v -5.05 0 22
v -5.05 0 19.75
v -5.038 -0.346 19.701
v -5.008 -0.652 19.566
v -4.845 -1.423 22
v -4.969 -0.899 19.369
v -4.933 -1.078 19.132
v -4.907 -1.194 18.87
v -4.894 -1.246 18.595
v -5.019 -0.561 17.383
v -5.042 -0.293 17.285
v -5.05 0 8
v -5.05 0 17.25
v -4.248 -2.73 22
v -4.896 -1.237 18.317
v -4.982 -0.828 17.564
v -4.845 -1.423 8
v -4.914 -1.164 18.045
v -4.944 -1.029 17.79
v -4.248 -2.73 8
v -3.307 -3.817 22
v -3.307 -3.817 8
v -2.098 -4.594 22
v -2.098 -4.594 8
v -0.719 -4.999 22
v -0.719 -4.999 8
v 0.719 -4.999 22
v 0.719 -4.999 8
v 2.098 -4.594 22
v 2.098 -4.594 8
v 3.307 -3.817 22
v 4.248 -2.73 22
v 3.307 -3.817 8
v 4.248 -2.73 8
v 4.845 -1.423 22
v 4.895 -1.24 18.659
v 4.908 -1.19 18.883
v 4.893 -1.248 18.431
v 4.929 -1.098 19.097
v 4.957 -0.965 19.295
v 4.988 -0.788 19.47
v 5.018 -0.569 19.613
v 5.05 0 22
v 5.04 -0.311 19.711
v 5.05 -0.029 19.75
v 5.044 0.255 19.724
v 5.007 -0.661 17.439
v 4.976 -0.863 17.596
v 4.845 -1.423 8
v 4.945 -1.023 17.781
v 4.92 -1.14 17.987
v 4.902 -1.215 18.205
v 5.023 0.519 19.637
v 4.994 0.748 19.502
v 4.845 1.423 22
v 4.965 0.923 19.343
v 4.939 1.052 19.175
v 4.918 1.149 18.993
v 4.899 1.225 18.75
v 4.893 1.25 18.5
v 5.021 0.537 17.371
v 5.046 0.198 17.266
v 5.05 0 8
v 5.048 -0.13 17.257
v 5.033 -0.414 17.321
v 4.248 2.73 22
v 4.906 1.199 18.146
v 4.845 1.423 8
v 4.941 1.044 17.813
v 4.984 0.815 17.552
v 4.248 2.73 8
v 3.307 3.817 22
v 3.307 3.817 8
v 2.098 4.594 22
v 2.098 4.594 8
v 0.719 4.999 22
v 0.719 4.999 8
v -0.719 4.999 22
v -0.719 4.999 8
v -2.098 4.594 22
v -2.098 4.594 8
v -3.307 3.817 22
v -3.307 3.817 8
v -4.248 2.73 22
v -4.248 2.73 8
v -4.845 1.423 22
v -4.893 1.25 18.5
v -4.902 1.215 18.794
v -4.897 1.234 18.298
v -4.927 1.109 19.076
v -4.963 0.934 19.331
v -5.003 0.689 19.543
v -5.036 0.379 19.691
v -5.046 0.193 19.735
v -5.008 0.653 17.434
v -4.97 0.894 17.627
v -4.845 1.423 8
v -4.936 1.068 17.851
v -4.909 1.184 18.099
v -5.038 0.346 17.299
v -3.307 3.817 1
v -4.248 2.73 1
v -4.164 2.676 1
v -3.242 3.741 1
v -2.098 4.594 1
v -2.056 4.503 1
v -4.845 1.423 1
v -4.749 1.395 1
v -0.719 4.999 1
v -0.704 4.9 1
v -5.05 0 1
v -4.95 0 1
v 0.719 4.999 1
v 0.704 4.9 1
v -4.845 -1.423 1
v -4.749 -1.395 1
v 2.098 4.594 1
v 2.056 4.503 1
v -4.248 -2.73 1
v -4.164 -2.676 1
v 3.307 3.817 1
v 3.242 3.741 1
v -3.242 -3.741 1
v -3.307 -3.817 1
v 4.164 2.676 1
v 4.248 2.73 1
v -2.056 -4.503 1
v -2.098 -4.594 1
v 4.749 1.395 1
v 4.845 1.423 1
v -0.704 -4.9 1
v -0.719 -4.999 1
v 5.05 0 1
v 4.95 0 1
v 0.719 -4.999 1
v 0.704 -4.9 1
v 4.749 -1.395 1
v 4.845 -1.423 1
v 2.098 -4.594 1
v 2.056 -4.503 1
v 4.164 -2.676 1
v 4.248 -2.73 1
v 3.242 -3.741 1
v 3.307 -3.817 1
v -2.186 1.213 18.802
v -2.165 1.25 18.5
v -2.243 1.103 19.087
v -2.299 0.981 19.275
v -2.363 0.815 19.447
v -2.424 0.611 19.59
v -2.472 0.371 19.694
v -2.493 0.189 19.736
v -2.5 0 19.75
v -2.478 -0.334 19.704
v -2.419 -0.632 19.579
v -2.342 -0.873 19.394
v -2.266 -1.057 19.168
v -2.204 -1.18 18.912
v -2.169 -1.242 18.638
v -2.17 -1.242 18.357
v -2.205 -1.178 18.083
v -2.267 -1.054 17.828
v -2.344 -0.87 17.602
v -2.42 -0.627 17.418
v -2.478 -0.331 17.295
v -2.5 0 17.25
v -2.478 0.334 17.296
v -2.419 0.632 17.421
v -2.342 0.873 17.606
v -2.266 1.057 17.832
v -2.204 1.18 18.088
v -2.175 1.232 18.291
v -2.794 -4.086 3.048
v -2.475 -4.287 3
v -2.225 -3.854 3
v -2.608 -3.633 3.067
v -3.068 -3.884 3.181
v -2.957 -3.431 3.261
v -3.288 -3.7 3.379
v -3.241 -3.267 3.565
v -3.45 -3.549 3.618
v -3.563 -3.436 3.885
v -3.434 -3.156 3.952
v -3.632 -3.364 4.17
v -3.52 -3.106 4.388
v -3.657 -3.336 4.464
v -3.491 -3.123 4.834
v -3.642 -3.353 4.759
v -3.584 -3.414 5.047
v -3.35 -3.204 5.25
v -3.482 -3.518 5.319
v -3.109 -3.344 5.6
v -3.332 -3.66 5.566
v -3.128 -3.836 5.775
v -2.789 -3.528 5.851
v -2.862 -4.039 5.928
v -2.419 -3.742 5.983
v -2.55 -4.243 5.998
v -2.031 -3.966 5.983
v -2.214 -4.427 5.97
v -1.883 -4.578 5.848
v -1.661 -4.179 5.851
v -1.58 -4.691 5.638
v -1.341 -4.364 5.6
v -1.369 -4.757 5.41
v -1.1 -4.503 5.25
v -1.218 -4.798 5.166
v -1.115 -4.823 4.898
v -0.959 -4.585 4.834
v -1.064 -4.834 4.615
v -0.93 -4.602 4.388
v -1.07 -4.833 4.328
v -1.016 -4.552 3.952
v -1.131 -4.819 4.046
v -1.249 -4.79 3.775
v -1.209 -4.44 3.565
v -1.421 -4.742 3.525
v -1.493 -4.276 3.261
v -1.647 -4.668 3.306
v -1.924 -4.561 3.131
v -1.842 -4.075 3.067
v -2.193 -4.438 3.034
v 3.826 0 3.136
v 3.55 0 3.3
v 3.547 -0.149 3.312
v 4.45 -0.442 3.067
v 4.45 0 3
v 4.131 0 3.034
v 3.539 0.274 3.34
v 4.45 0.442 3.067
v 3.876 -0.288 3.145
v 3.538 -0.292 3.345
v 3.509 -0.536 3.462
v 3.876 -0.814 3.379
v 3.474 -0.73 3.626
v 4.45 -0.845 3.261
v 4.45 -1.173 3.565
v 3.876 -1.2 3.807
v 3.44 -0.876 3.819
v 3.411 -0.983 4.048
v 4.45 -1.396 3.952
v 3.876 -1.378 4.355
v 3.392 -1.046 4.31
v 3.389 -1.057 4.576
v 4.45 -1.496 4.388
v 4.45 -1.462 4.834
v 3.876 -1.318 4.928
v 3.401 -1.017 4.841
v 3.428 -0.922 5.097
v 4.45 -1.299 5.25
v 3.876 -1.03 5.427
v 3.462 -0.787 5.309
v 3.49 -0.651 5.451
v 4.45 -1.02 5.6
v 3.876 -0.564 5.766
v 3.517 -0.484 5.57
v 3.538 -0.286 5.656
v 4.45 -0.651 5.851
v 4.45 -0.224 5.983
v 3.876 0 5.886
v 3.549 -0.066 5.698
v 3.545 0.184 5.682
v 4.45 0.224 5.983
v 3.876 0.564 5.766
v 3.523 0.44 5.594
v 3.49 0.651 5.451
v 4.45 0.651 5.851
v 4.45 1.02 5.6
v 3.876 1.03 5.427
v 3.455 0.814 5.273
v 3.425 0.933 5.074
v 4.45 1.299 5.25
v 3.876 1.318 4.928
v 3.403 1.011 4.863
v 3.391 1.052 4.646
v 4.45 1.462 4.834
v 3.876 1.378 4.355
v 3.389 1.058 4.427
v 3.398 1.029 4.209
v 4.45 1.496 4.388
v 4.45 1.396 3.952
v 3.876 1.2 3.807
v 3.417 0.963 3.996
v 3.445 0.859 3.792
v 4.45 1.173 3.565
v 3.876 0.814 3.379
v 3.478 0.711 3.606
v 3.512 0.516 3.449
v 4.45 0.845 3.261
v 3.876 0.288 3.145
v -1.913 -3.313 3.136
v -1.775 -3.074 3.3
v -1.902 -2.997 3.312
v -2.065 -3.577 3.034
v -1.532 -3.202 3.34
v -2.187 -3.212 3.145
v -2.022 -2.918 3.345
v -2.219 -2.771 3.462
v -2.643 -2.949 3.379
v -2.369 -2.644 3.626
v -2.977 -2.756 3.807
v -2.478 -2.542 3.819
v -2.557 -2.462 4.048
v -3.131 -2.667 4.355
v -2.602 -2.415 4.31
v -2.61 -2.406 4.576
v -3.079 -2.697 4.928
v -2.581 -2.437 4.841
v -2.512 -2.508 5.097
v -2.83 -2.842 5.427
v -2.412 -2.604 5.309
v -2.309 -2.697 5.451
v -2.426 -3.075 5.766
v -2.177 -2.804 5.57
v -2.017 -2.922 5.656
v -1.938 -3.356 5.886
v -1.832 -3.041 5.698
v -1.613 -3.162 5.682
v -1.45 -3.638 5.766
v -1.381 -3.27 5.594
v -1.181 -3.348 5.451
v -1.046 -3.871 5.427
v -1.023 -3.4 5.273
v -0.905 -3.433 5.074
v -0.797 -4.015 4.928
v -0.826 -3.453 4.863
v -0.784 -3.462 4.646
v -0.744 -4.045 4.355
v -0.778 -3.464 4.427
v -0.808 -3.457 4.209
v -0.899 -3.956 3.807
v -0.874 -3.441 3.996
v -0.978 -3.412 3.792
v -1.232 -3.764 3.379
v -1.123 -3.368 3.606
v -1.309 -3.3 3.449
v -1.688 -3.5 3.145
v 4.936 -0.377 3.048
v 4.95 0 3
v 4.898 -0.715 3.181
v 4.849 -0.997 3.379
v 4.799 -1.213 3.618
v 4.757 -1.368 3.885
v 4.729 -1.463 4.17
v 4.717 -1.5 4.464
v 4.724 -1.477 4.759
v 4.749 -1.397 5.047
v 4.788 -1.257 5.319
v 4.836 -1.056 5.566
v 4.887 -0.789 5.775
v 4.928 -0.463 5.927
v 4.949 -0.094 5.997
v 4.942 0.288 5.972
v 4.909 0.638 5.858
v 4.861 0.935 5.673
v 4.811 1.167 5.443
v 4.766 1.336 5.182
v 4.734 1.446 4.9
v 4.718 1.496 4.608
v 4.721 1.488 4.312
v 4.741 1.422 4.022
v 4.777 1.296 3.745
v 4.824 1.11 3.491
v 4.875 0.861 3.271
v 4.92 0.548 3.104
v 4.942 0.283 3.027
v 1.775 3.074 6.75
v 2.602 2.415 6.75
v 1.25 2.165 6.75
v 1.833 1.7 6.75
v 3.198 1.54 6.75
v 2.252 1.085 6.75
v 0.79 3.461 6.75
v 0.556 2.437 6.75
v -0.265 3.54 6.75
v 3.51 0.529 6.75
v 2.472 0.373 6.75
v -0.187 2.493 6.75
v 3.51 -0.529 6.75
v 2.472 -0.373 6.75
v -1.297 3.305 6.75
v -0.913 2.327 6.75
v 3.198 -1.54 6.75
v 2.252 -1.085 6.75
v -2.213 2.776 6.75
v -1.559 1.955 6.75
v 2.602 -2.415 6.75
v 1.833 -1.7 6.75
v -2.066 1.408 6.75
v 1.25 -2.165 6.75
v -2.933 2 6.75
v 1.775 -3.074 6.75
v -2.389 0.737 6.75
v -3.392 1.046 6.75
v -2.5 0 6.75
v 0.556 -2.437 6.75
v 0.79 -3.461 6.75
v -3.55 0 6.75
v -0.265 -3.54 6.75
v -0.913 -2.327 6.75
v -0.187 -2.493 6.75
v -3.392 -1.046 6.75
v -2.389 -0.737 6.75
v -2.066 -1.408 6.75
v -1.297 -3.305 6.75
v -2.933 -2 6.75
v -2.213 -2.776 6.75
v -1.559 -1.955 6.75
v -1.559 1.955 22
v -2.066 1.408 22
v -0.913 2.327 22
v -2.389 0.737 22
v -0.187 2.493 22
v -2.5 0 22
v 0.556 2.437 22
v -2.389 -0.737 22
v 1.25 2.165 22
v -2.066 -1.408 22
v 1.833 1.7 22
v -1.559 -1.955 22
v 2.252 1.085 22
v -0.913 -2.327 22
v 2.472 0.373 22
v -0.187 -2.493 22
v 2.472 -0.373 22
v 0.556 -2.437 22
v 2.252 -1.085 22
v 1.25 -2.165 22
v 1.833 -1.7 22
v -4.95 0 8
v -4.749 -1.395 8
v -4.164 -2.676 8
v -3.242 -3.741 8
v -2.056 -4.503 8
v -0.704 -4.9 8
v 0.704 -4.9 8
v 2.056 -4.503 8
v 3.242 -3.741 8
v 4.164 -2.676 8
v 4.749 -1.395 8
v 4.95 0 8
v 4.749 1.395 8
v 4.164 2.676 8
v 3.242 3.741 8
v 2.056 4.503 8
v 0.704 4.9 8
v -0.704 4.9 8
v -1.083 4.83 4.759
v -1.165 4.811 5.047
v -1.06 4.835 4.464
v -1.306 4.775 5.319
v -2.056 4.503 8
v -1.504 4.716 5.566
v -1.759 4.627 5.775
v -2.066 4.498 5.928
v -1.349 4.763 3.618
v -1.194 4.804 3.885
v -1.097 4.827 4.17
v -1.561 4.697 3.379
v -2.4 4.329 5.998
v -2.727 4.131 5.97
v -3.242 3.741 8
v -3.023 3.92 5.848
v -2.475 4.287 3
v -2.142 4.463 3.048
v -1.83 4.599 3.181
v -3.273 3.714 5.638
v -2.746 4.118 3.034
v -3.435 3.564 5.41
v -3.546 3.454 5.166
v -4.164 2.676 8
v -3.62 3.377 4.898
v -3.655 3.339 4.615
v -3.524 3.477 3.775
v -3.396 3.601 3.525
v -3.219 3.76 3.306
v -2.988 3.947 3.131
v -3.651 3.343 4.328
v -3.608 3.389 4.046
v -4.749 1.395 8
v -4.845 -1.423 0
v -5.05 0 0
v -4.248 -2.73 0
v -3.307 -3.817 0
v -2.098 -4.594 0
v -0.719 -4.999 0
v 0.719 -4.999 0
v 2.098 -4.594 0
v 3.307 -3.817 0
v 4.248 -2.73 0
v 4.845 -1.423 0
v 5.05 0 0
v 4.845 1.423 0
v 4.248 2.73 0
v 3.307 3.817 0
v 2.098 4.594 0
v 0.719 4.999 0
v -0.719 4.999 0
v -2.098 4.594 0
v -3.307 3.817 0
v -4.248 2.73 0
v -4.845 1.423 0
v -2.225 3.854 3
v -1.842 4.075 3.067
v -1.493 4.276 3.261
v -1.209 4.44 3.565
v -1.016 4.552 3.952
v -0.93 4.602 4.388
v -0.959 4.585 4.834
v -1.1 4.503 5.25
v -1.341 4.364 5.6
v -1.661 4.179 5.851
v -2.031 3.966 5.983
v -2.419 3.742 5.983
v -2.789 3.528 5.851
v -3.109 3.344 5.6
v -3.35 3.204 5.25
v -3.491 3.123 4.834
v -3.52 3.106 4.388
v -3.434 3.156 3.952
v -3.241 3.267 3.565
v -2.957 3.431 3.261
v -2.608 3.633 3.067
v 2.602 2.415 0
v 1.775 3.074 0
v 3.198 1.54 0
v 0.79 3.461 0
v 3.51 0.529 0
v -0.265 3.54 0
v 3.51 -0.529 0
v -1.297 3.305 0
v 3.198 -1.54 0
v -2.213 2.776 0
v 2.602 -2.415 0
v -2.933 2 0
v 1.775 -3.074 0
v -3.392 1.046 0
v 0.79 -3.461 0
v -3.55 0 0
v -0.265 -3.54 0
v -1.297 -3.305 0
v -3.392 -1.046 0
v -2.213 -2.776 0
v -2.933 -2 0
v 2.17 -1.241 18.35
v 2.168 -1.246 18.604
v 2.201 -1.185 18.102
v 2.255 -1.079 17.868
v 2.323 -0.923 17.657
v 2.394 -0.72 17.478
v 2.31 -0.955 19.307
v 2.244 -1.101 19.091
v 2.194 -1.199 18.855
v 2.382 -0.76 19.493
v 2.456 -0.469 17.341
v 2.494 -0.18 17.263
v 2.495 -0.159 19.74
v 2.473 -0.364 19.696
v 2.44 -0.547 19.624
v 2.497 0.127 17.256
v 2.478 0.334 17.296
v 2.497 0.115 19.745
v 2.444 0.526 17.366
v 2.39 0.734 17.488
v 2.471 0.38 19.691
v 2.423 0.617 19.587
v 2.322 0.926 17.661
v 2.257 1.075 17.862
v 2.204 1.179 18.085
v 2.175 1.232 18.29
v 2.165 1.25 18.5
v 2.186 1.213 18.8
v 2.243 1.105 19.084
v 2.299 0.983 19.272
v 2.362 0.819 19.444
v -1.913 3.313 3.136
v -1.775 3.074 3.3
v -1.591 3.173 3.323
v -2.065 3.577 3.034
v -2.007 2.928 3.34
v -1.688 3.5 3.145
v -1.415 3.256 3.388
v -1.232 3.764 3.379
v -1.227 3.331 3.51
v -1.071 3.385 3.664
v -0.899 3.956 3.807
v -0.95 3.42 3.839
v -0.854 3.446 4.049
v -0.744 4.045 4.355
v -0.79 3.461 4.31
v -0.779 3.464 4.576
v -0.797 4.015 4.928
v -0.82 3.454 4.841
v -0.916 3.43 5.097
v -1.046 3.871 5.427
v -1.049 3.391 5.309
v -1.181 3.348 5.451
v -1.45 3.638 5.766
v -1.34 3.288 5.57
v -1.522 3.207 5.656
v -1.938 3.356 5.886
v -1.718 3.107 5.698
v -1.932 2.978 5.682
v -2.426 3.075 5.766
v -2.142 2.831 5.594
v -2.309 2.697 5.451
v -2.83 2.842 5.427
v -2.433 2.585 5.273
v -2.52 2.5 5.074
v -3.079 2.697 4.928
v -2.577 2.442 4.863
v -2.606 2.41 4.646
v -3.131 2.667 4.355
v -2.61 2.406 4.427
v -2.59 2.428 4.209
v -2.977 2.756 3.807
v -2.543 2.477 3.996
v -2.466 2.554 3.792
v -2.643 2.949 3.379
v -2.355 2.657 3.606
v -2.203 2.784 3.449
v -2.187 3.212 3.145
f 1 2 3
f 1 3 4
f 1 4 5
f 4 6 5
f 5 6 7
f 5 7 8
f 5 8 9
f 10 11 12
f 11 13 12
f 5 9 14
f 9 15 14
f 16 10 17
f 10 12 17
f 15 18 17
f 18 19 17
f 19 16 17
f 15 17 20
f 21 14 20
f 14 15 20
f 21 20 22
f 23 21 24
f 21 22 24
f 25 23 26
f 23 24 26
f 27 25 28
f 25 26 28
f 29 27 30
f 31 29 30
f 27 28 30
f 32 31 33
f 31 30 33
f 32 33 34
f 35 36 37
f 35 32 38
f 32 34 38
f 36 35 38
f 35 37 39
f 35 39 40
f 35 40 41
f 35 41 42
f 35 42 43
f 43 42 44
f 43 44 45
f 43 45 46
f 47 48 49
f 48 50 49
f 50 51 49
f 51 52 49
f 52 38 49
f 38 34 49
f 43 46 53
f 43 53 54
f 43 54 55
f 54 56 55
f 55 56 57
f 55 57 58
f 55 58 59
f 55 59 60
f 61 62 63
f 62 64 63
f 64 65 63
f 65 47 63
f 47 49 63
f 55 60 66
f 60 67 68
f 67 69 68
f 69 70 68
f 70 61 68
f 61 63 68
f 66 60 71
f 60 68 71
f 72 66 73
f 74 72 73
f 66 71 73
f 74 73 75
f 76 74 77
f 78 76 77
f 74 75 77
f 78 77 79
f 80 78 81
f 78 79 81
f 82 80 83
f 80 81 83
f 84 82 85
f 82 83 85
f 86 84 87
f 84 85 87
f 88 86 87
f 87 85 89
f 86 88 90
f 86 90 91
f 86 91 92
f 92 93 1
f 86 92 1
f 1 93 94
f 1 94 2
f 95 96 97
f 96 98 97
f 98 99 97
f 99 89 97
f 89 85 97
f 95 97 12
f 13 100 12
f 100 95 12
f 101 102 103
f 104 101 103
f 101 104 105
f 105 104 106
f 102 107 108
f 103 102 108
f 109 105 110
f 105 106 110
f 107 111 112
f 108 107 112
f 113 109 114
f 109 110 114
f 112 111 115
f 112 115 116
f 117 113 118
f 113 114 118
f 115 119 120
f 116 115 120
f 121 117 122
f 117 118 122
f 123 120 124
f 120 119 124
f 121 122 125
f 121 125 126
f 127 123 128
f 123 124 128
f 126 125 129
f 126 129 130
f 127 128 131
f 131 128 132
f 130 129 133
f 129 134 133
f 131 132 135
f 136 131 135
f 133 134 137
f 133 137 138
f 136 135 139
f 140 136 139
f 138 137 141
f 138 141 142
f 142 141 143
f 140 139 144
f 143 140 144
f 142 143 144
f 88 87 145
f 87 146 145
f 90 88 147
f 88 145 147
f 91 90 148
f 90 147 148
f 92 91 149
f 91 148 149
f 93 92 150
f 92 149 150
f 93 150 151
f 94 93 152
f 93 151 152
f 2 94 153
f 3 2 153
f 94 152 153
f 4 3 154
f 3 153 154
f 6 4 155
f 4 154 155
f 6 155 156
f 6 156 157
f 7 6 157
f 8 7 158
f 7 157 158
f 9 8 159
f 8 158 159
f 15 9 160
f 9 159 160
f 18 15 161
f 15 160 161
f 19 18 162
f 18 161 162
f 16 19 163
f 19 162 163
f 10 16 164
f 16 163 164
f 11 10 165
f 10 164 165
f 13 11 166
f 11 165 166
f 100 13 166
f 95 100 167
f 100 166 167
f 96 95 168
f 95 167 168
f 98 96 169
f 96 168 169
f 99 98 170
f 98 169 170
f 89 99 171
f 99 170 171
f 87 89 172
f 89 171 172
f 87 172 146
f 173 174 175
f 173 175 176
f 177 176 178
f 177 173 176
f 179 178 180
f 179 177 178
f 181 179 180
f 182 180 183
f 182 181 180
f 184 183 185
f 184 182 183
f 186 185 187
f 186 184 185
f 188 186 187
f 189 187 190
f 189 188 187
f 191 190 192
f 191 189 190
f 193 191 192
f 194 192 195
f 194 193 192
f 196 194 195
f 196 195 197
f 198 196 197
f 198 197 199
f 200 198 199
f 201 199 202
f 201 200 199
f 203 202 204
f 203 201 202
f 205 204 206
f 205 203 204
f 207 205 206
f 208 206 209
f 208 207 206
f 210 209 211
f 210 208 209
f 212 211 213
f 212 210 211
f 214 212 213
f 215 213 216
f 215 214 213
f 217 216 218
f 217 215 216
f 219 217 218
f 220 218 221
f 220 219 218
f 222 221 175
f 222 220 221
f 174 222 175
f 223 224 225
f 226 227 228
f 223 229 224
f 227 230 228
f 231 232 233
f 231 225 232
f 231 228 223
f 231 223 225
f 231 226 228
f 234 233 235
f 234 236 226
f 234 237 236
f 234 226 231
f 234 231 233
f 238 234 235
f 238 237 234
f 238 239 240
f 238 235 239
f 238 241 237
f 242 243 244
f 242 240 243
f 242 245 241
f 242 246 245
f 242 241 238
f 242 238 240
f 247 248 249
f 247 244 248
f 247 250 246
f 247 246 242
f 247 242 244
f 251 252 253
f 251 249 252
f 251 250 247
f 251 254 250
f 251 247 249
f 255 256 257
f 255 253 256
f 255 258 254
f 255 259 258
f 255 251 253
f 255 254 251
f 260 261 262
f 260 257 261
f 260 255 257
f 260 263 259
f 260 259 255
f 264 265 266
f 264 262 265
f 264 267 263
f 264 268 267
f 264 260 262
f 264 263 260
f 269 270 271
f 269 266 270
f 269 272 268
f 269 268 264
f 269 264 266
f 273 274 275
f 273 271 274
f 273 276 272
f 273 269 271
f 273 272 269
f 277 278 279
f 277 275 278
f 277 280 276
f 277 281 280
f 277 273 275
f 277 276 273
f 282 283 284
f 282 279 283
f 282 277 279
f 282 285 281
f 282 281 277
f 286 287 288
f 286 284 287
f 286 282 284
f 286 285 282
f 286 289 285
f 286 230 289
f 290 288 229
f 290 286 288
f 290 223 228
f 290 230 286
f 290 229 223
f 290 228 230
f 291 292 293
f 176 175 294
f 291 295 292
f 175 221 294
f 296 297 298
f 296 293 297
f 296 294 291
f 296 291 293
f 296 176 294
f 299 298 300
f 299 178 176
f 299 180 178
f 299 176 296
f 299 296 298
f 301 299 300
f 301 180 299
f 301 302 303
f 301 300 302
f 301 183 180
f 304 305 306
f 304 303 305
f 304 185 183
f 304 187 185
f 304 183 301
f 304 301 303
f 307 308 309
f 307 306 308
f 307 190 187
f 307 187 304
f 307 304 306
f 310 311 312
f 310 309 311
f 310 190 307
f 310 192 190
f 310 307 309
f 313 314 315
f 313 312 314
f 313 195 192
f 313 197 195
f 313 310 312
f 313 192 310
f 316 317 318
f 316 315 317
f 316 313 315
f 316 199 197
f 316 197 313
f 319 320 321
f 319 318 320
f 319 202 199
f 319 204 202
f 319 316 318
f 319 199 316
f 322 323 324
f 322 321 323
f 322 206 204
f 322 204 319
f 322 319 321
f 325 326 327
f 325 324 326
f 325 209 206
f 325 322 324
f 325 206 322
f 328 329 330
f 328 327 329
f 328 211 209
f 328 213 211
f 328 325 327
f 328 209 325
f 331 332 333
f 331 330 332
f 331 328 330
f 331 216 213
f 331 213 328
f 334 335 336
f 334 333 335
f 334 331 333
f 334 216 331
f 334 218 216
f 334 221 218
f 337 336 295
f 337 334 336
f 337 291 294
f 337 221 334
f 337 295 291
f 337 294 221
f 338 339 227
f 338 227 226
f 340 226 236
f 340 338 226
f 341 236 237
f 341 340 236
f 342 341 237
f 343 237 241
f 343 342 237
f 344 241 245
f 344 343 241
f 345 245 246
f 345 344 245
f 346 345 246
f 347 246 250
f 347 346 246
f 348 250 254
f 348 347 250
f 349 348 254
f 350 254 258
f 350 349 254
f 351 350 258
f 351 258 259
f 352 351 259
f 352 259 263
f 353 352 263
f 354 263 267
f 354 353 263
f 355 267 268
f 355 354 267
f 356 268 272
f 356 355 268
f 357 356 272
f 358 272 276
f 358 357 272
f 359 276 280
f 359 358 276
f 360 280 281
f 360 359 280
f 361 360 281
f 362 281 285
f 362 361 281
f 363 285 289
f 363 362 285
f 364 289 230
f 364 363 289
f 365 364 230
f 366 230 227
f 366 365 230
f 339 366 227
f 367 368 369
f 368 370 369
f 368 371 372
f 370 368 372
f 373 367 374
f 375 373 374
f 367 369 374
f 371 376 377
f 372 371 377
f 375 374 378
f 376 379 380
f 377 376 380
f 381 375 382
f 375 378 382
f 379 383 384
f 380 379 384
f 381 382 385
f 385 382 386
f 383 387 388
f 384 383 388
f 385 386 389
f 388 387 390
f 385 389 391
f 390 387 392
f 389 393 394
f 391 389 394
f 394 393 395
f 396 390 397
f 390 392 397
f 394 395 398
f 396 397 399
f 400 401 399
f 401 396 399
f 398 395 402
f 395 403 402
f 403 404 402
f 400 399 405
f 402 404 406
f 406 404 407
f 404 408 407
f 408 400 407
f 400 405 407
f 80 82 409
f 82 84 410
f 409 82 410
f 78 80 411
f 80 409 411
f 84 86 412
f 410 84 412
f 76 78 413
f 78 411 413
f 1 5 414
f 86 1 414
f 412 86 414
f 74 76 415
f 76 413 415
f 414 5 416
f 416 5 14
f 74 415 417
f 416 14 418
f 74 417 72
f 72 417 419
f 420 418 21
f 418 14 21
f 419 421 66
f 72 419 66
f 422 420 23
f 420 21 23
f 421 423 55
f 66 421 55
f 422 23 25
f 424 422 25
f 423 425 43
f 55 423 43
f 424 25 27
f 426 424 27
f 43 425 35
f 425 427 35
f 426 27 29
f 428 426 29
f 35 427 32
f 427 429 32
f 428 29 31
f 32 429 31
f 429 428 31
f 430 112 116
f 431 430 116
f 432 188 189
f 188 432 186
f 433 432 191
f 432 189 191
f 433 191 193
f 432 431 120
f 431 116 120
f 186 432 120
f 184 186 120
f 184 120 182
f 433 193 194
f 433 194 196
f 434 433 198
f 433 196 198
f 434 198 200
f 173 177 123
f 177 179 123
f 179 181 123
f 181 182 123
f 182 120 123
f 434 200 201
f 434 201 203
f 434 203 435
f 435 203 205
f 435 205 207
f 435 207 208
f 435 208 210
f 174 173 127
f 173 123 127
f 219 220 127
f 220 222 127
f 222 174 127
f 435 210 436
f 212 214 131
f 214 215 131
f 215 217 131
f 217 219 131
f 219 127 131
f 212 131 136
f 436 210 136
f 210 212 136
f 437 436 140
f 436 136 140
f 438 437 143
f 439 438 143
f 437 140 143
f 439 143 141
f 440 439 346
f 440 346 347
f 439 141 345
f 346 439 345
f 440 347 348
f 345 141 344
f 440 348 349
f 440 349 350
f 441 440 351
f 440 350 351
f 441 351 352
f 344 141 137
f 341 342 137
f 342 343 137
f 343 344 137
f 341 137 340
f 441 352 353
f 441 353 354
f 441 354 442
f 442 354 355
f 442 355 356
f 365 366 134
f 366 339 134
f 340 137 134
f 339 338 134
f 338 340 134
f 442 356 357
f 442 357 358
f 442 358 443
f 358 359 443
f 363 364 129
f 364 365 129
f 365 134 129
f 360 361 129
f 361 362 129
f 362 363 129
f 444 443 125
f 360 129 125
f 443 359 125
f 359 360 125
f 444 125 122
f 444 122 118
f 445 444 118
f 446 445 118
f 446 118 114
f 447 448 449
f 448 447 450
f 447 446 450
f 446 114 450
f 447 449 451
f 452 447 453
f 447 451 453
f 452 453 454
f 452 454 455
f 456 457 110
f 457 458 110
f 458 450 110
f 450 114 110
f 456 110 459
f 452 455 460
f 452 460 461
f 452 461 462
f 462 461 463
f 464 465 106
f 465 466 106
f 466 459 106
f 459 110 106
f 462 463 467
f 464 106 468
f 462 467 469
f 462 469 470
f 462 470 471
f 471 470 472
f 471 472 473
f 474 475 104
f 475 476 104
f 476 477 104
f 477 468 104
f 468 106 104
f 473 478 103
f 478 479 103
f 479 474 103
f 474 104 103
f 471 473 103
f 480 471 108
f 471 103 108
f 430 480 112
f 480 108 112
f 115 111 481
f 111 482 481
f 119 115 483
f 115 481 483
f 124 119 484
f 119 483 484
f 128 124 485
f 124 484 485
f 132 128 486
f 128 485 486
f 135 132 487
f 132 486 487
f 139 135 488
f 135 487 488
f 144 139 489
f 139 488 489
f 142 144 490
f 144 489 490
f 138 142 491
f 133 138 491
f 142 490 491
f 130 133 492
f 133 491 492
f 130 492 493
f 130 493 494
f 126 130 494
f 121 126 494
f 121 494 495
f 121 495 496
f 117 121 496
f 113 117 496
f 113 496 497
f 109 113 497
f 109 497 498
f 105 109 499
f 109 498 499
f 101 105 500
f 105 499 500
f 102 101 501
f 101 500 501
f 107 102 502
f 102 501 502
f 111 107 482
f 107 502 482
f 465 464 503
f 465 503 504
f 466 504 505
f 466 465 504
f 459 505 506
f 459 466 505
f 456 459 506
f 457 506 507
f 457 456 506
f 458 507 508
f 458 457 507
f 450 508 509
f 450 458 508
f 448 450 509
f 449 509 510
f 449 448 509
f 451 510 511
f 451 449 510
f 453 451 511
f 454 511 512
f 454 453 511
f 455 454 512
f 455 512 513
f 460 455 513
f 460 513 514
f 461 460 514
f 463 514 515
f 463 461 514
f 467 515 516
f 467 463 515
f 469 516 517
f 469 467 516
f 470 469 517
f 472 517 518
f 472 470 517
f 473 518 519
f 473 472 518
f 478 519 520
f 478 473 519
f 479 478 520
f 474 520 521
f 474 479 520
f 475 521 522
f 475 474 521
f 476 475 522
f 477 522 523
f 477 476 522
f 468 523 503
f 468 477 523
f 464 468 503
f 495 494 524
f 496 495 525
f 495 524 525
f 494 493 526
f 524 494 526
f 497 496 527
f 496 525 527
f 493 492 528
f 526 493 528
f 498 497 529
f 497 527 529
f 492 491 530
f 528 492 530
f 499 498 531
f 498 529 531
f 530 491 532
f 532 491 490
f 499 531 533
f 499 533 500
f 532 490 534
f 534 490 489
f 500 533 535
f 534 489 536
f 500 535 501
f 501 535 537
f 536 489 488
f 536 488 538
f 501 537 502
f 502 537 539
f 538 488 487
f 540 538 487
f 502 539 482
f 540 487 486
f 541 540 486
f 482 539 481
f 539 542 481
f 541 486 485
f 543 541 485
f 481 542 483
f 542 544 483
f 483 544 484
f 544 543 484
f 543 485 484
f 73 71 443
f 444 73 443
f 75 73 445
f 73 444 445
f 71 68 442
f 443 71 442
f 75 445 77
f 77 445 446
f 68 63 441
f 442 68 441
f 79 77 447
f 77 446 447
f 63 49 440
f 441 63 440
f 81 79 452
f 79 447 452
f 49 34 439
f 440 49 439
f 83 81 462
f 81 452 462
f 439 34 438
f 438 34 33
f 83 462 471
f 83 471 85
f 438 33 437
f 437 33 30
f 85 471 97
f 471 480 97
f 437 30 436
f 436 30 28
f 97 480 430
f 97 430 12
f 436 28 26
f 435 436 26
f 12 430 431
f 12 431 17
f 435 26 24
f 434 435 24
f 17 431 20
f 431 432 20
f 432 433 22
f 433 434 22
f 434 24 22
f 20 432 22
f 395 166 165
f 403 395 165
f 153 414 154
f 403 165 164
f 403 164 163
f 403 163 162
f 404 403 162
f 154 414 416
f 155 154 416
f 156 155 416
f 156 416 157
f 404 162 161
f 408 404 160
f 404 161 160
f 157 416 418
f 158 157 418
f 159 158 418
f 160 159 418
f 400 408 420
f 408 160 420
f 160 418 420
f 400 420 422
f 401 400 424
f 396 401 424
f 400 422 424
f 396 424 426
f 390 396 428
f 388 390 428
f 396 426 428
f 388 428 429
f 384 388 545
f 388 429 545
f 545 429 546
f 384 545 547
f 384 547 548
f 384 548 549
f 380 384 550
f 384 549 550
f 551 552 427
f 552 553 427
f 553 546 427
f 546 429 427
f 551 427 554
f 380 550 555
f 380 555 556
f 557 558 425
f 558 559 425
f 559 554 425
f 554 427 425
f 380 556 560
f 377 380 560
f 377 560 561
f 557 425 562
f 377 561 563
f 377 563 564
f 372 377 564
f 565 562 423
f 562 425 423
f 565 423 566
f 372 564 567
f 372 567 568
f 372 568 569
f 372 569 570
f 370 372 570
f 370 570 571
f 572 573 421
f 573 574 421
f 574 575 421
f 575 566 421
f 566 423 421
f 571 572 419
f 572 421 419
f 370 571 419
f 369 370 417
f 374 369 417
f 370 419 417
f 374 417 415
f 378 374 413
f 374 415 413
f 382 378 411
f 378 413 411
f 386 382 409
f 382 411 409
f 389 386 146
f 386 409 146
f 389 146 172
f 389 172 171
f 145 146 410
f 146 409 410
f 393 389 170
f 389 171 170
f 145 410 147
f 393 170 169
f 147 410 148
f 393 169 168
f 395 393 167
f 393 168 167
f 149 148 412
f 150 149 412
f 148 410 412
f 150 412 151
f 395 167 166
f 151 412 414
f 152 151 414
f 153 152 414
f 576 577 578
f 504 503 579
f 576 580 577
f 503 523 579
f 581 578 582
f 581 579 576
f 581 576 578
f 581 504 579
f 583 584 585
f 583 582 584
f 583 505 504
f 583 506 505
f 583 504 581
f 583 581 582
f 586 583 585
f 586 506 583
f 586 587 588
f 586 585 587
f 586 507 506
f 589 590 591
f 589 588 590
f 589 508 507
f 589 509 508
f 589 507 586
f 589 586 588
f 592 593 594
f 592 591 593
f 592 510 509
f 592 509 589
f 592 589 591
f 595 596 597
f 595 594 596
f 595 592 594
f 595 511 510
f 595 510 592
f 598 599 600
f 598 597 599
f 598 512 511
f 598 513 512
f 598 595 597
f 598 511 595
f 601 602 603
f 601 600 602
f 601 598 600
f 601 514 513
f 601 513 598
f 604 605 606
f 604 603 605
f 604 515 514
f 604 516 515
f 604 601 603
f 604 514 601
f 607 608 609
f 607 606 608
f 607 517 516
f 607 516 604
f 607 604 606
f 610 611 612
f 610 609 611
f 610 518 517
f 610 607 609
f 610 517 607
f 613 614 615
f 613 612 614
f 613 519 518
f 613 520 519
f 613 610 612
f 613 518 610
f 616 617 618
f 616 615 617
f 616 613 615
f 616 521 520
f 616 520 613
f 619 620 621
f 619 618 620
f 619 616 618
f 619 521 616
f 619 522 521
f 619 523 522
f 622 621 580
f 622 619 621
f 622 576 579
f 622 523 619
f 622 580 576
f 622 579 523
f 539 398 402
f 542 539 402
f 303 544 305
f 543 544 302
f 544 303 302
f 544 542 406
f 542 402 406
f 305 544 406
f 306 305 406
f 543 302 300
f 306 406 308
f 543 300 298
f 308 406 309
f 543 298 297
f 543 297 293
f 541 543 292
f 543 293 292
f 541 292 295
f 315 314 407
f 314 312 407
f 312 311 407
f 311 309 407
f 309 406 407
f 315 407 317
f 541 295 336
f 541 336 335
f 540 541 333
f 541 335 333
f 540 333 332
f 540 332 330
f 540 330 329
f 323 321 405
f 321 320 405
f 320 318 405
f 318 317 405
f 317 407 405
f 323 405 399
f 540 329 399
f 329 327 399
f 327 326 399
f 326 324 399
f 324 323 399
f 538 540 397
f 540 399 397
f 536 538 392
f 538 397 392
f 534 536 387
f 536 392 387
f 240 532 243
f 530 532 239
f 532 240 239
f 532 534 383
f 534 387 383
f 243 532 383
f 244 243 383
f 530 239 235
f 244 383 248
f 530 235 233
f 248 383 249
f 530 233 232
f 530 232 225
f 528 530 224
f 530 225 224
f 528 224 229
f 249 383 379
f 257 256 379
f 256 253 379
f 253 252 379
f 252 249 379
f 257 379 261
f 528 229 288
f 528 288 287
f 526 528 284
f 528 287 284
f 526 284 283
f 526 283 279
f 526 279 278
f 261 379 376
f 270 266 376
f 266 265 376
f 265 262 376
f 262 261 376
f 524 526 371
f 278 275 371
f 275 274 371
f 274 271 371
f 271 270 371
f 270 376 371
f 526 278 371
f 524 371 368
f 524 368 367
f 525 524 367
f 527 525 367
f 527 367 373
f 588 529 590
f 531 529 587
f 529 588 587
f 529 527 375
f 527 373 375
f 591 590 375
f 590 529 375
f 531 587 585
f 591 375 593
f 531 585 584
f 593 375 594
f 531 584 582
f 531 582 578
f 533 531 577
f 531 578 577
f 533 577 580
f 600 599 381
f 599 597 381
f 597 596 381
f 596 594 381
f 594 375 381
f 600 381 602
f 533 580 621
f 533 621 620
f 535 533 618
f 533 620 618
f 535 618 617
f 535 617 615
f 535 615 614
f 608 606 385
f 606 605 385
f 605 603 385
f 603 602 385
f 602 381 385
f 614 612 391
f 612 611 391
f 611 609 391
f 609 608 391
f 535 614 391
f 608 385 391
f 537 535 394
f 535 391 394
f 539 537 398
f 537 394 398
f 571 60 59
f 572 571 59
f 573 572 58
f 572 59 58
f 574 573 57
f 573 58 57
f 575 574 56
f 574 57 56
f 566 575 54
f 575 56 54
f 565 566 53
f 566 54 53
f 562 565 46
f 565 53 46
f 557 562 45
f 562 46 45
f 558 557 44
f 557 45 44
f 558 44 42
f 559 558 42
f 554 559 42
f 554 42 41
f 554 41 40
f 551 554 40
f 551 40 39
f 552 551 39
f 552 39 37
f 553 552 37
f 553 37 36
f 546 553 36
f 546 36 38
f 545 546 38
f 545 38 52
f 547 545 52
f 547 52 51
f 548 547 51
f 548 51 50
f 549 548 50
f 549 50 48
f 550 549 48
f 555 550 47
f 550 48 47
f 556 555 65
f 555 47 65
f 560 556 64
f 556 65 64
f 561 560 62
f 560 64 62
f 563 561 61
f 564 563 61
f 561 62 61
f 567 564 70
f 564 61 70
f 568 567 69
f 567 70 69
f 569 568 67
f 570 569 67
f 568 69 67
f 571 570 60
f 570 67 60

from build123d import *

# Parameters (mm, degrees)
BALL_CUT_PATTERN_COUNT      = 3
M3X0_5_TAPPED_HOLE1_REACH   = 23.674
M3X0_5_TAPPED_HOLE1_BORE_R  = 1.25
SET_SCREW_PATTERN_OUTLINE_W = 1.25
SET_SCREW_PATTERN_OUTLINE_H = 2.885095828


# Read off the part's stored shape, not the designer's step: Set Screw Pattern
with BuildPart() as part:
    # Body Sketch → Body Revolve (revolve)
    with BuildSketch(Plane(origin=(-33.219700818, 0, -2.434260963), x_dir=(-1, 0, 0), z_dir=(0, 1, 0)), mode=Mode.PRIVATE) as body_revolve_sk:
        Polygon((-35.719700818, 24.434260963), (-38.269700818, 24.434260963), (-38.269700818, 10.434260963), (-38.169700818, 10.434260963), (-38.169700818, 3.434260963), (-38.269700818, 3.434260963), (-38.269700818, 2.434260963), (-36.769700818, 2.434260963), (-36.769700818, 9.184260963), (-35.719700818, 9.184260963), align=None)
    revolve(body_revolve_sk.sketch.rotate(Axis((0, 0, 0), (0, 0, 1)), 180), axis=Axis((0, 0, 0), (0, 0, 1)))

    # Ball Cut Out Sketch → Ball Cut Revolve (revolve, cut)
    with BuildSketch(Plane(origin=(0, 0, 0), x_dir=(1, 0, 0), z_dir=(0, 1, 0)), mode=Mode.PRIVATE) as ball_cut_revolve_sk:
        with BuildLine():
            Line((4.45, -6), (9.45, -6))
            Line((9.45, -6), (9.45, -4.5))
            Line((9.45, -4.5), (2.95, -4.5))
            ThreePointArc((2.95, -4.5), (3.389339828, -5.560660172), (4.45, -6))
        make_face()
    ball_cut_revolve = revolve(ball_cut_revolve_sk.sketch.rotate(Axis((9.45, 0, 4.5), (-1, 0, 0)), 180), axis=Axis((9.45, 0, 4.5), (-1, 0, 0)), mode=Mode.SUBTRACT)

    # Ball Cut Pattern: Ball Cut Revolve ×3 about axis
    ball_cut_pattern_axis = Axis((0, 0, 0), (0, 0, 1))
    for i in range(1, BALL_CUT_PATTERN_COUNT):
        add(ball_cut_revolve.rotate(ball_cut_pattern_axis, i * 360 / BALL_CUT_PATTERN_COUNT), mode=Mode.SUBTRACT)

    # M3x0.5 Tapped Hole1 bore (on position points) → M3x0.5 Tapped Hole1 (cut, up to next)
    with BuildSketch(Plane(origin=(5.05, 0, 18.5), x_dir=(0, 1, 0), z_dir=(1, 0, 0)), mode=Mode.PRIVATE) as m3x0_5_tapped_hole1_sk1:
        Circle(M3X0_5_TAPPED_HOLE1_BORE_R)
    m3x0_5_tapped_hole1_tool1 = extrude(m3x0_5_tapped_hole1_sk1.sketch, amount=-M3X0_5_TAPPED_HOLE1_REACH, mode=Mode.PRIVATE) & part.part
    add(m3x0_5_tapped_hole1_tool1.solids().sort_by_distance((5.05, 0, 18.5))[0], mode=Mode.SUBTRACT)

    # Set Screw Pattern outline → Set Screw Pattern (revolve, cut)
    with BuildSketch(Plane.YX.offset(-18.5)):
        with Locations((0.625, -3.607452342)):
            Rectangle(SET_SCREW_PATTERN_OUTLINE_W, SET_SCREW_PATTERN_OUTLINE_H)
    revolve(axis=Axis((0, 0, 18.5), (1, 0, 0)), mode=Mode.SUBTRACT)


solid = part.part
